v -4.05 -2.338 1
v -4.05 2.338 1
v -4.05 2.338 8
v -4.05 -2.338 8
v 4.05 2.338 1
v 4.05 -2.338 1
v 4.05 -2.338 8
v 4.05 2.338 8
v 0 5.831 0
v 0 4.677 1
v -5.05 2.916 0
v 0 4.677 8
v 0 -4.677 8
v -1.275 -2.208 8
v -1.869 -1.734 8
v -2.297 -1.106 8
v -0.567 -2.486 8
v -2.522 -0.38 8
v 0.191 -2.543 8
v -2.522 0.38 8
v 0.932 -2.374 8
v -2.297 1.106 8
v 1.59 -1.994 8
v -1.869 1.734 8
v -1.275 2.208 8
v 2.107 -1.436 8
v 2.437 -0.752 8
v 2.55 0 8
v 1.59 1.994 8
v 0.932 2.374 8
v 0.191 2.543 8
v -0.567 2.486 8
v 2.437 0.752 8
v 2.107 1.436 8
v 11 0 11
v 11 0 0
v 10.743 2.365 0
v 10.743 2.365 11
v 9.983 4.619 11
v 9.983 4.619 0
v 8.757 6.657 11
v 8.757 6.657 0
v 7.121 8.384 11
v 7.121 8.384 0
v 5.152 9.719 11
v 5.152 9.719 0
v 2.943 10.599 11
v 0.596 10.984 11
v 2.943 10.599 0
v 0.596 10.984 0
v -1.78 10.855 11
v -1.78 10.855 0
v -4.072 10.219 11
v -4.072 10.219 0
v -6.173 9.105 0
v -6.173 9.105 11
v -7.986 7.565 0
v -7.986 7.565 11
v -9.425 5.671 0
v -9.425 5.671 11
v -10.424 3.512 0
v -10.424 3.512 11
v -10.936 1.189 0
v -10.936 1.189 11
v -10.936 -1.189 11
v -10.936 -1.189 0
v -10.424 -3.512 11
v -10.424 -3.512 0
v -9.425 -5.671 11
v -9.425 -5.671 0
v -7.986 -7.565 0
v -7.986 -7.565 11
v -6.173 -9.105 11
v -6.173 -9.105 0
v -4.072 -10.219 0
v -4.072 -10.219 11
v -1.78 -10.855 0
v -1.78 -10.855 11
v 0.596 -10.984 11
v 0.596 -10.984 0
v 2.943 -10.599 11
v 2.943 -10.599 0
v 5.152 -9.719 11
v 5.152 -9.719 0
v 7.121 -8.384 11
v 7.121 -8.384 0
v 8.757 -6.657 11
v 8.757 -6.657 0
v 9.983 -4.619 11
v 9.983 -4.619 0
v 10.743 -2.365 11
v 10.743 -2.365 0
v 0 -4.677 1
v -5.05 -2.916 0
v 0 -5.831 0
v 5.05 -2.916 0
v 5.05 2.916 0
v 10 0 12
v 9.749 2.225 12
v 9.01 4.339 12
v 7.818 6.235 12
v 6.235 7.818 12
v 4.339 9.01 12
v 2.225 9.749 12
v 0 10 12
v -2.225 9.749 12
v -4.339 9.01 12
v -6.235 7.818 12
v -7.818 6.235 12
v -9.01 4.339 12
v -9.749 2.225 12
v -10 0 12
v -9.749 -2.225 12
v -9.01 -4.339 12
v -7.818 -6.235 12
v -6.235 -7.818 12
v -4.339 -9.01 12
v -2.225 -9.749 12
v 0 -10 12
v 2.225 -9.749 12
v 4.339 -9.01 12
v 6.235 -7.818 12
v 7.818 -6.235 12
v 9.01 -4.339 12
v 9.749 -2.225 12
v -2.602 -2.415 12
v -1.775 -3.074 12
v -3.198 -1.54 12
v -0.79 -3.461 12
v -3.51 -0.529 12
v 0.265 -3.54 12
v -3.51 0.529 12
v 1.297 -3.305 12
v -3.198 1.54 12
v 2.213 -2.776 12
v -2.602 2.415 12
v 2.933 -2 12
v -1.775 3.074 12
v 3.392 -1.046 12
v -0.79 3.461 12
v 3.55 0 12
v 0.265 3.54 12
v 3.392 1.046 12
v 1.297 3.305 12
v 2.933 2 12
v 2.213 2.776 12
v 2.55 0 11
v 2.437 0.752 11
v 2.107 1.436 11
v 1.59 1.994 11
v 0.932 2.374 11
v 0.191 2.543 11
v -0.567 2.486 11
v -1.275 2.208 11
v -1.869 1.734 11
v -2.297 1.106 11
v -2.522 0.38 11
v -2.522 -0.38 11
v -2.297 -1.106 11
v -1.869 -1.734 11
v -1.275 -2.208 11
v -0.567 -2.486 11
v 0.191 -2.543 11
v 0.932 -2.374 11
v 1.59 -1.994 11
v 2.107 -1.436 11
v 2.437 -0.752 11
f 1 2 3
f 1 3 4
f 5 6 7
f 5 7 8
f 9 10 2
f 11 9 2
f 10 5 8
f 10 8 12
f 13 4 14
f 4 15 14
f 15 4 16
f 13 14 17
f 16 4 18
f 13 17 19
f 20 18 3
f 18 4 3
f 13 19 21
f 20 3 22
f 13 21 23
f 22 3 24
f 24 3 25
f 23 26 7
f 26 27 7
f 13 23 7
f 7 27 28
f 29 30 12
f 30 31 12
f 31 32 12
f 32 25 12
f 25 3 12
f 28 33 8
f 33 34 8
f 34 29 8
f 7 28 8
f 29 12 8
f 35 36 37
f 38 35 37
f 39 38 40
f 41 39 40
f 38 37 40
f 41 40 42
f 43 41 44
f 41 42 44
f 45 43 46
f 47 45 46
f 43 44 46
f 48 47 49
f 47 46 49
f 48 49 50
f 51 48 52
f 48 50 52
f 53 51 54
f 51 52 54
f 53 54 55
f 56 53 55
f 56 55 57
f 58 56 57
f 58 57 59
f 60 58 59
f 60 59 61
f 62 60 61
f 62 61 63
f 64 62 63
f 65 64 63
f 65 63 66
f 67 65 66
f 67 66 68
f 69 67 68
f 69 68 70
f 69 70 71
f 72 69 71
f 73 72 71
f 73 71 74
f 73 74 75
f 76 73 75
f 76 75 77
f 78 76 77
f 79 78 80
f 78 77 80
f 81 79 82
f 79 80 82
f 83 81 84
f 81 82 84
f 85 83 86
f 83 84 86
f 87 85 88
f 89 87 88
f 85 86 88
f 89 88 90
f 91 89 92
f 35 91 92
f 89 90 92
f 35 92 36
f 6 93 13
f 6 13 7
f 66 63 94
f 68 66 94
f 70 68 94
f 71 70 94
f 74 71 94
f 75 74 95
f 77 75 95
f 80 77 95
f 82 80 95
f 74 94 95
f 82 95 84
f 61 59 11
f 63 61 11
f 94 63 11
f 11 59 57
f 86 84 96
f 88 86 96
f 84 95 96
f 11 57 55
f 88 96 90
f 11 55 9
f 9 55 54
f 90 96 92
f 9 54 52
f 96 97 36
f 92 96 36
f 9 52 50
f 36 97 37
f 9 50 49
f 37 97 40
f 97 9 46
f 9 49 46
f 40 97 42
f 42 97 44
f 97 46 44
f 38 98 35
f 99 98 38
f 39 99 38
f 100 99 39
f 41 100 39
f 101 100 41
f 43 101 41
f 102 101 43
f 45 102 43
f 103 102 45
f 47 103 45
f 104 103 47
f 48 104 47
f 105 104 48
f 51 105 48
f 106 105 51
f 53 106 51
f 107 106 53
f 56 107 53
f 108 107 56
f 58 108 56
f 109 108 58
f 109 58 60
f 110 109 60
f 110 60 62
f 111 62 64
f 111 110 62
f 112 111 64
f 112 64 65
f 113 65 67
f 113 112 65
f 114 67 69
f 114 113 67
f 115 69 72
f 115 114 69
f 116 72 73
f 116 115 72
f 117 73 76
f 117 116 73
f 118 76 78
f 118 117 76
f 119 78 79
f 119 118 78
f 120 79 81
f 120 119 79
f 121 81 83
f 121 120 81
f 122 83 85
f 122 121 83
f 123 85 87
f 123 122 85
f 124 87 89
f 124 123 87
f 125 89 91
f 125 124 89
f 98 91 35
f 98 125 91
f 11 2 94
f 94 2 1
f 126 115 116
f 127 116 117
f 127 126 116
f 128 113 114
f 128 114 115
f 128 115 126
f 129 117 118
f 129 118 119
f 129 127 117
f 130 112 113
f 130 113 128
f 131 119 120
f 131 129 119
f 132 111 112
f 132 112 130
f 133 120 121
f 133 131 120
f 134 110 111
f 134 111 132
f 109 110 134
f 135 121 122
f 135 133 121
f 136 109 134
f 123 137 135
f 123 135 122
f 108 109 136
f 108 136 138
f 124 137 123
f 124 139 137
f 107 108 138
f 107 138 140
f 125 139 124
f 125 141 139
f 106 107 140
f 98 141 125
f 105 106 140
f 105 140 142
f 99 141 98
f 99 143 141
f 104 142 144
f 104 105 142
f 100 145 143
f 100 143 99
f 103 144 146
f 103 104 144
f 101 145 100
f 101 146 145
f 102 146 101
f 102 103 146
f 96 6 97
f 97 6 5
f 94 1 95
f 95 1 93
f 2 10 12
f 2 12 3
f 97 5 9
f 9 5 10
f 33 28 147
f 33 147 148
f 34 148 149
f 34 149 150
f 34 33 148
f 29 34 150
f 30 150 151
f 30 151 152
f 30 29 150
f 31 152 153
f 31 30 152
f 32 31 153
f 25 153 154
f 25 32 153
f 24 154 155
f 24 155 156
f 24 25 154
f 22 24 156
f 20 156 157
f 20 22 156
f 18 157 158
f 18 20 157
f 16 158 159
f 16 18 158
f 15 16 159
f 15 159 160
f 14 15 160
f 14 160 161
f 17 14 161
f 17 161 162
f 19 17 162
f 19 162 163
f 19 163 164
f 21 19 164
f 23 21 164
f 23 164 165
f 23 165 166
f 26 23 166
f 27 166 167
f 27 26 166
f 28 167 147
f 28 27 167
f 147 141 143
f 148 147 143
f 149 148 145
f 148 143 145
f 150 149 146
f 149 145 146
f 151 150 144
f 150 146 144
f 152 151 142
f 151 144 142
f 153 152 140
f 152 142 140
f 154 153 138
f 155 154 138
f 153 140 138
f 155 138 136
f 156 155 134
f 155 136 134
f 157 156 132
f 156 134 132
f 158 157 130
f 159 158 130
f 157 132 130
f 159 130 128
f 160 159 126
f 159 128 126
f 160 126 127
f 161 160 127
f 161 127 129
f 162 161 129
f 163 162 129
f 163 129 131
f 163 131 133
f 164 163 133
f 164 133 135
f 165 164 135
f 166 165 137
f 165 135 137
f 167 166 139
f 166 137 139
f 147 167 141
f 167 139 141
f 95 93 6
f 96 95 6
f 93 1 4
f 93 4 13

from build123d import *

# Parameters (mm, degrees)
SKETCH1_R           = 11
BOSS_EXTRUDE1_DEPTH = 8
SKETCH2_R           = 11
SKETCH2_R_2         = 2.55
BOSS_EXTRUDE2_DEPTH = 4
CHAMFER1_SIZE       = 1


with BuildPart() as part:
    # Sketch1 → Boss-Extrude1 (new body)
    with BuildSketch(Plane.XY):
        Circle(SKETCH1_R)
        Polygon((4.05, 2.33826859), (0, 4.67653718), (-4.05, 2.33826859), (-4.05, -2.33826859), (0, -4.67653718), (4.05, -2.33826859), align=None, mode=Mode.SUBTRACT)
    extrude(amount=BOSS_EXTRUDE1_DEPTH)

    # Sketch2 → Boss-Extrude2 (add)
    with BuildSketch(Plane.XY.offset(8)):
        Circle(SKETCH2_R)
        Circle(SKETCH2_R_2, mode=Mode.SUBTRACT)
    extrude(amount=BOSS_EXTRUDE2_DEPTH)

    # Chamfer1
    chamfer1_edges = [part.edges().sort_by_distance(p)[0] for p in [
        (-2.025, 3.507402885, 0),
        (-4.05, 0, 0),
        (-2.025, -3.507402885, 0),
        (2.025, -3.507402885, 0),
        (-11, 0, 12),
        (-2.55, 0, 12),
        (4.05, 0, 0),
        (2.025, 3.507402885, 0),
    ]]
    chamfer(chamfer1_edges, length=CHAMFER1_SIZE)


solid = part.part
